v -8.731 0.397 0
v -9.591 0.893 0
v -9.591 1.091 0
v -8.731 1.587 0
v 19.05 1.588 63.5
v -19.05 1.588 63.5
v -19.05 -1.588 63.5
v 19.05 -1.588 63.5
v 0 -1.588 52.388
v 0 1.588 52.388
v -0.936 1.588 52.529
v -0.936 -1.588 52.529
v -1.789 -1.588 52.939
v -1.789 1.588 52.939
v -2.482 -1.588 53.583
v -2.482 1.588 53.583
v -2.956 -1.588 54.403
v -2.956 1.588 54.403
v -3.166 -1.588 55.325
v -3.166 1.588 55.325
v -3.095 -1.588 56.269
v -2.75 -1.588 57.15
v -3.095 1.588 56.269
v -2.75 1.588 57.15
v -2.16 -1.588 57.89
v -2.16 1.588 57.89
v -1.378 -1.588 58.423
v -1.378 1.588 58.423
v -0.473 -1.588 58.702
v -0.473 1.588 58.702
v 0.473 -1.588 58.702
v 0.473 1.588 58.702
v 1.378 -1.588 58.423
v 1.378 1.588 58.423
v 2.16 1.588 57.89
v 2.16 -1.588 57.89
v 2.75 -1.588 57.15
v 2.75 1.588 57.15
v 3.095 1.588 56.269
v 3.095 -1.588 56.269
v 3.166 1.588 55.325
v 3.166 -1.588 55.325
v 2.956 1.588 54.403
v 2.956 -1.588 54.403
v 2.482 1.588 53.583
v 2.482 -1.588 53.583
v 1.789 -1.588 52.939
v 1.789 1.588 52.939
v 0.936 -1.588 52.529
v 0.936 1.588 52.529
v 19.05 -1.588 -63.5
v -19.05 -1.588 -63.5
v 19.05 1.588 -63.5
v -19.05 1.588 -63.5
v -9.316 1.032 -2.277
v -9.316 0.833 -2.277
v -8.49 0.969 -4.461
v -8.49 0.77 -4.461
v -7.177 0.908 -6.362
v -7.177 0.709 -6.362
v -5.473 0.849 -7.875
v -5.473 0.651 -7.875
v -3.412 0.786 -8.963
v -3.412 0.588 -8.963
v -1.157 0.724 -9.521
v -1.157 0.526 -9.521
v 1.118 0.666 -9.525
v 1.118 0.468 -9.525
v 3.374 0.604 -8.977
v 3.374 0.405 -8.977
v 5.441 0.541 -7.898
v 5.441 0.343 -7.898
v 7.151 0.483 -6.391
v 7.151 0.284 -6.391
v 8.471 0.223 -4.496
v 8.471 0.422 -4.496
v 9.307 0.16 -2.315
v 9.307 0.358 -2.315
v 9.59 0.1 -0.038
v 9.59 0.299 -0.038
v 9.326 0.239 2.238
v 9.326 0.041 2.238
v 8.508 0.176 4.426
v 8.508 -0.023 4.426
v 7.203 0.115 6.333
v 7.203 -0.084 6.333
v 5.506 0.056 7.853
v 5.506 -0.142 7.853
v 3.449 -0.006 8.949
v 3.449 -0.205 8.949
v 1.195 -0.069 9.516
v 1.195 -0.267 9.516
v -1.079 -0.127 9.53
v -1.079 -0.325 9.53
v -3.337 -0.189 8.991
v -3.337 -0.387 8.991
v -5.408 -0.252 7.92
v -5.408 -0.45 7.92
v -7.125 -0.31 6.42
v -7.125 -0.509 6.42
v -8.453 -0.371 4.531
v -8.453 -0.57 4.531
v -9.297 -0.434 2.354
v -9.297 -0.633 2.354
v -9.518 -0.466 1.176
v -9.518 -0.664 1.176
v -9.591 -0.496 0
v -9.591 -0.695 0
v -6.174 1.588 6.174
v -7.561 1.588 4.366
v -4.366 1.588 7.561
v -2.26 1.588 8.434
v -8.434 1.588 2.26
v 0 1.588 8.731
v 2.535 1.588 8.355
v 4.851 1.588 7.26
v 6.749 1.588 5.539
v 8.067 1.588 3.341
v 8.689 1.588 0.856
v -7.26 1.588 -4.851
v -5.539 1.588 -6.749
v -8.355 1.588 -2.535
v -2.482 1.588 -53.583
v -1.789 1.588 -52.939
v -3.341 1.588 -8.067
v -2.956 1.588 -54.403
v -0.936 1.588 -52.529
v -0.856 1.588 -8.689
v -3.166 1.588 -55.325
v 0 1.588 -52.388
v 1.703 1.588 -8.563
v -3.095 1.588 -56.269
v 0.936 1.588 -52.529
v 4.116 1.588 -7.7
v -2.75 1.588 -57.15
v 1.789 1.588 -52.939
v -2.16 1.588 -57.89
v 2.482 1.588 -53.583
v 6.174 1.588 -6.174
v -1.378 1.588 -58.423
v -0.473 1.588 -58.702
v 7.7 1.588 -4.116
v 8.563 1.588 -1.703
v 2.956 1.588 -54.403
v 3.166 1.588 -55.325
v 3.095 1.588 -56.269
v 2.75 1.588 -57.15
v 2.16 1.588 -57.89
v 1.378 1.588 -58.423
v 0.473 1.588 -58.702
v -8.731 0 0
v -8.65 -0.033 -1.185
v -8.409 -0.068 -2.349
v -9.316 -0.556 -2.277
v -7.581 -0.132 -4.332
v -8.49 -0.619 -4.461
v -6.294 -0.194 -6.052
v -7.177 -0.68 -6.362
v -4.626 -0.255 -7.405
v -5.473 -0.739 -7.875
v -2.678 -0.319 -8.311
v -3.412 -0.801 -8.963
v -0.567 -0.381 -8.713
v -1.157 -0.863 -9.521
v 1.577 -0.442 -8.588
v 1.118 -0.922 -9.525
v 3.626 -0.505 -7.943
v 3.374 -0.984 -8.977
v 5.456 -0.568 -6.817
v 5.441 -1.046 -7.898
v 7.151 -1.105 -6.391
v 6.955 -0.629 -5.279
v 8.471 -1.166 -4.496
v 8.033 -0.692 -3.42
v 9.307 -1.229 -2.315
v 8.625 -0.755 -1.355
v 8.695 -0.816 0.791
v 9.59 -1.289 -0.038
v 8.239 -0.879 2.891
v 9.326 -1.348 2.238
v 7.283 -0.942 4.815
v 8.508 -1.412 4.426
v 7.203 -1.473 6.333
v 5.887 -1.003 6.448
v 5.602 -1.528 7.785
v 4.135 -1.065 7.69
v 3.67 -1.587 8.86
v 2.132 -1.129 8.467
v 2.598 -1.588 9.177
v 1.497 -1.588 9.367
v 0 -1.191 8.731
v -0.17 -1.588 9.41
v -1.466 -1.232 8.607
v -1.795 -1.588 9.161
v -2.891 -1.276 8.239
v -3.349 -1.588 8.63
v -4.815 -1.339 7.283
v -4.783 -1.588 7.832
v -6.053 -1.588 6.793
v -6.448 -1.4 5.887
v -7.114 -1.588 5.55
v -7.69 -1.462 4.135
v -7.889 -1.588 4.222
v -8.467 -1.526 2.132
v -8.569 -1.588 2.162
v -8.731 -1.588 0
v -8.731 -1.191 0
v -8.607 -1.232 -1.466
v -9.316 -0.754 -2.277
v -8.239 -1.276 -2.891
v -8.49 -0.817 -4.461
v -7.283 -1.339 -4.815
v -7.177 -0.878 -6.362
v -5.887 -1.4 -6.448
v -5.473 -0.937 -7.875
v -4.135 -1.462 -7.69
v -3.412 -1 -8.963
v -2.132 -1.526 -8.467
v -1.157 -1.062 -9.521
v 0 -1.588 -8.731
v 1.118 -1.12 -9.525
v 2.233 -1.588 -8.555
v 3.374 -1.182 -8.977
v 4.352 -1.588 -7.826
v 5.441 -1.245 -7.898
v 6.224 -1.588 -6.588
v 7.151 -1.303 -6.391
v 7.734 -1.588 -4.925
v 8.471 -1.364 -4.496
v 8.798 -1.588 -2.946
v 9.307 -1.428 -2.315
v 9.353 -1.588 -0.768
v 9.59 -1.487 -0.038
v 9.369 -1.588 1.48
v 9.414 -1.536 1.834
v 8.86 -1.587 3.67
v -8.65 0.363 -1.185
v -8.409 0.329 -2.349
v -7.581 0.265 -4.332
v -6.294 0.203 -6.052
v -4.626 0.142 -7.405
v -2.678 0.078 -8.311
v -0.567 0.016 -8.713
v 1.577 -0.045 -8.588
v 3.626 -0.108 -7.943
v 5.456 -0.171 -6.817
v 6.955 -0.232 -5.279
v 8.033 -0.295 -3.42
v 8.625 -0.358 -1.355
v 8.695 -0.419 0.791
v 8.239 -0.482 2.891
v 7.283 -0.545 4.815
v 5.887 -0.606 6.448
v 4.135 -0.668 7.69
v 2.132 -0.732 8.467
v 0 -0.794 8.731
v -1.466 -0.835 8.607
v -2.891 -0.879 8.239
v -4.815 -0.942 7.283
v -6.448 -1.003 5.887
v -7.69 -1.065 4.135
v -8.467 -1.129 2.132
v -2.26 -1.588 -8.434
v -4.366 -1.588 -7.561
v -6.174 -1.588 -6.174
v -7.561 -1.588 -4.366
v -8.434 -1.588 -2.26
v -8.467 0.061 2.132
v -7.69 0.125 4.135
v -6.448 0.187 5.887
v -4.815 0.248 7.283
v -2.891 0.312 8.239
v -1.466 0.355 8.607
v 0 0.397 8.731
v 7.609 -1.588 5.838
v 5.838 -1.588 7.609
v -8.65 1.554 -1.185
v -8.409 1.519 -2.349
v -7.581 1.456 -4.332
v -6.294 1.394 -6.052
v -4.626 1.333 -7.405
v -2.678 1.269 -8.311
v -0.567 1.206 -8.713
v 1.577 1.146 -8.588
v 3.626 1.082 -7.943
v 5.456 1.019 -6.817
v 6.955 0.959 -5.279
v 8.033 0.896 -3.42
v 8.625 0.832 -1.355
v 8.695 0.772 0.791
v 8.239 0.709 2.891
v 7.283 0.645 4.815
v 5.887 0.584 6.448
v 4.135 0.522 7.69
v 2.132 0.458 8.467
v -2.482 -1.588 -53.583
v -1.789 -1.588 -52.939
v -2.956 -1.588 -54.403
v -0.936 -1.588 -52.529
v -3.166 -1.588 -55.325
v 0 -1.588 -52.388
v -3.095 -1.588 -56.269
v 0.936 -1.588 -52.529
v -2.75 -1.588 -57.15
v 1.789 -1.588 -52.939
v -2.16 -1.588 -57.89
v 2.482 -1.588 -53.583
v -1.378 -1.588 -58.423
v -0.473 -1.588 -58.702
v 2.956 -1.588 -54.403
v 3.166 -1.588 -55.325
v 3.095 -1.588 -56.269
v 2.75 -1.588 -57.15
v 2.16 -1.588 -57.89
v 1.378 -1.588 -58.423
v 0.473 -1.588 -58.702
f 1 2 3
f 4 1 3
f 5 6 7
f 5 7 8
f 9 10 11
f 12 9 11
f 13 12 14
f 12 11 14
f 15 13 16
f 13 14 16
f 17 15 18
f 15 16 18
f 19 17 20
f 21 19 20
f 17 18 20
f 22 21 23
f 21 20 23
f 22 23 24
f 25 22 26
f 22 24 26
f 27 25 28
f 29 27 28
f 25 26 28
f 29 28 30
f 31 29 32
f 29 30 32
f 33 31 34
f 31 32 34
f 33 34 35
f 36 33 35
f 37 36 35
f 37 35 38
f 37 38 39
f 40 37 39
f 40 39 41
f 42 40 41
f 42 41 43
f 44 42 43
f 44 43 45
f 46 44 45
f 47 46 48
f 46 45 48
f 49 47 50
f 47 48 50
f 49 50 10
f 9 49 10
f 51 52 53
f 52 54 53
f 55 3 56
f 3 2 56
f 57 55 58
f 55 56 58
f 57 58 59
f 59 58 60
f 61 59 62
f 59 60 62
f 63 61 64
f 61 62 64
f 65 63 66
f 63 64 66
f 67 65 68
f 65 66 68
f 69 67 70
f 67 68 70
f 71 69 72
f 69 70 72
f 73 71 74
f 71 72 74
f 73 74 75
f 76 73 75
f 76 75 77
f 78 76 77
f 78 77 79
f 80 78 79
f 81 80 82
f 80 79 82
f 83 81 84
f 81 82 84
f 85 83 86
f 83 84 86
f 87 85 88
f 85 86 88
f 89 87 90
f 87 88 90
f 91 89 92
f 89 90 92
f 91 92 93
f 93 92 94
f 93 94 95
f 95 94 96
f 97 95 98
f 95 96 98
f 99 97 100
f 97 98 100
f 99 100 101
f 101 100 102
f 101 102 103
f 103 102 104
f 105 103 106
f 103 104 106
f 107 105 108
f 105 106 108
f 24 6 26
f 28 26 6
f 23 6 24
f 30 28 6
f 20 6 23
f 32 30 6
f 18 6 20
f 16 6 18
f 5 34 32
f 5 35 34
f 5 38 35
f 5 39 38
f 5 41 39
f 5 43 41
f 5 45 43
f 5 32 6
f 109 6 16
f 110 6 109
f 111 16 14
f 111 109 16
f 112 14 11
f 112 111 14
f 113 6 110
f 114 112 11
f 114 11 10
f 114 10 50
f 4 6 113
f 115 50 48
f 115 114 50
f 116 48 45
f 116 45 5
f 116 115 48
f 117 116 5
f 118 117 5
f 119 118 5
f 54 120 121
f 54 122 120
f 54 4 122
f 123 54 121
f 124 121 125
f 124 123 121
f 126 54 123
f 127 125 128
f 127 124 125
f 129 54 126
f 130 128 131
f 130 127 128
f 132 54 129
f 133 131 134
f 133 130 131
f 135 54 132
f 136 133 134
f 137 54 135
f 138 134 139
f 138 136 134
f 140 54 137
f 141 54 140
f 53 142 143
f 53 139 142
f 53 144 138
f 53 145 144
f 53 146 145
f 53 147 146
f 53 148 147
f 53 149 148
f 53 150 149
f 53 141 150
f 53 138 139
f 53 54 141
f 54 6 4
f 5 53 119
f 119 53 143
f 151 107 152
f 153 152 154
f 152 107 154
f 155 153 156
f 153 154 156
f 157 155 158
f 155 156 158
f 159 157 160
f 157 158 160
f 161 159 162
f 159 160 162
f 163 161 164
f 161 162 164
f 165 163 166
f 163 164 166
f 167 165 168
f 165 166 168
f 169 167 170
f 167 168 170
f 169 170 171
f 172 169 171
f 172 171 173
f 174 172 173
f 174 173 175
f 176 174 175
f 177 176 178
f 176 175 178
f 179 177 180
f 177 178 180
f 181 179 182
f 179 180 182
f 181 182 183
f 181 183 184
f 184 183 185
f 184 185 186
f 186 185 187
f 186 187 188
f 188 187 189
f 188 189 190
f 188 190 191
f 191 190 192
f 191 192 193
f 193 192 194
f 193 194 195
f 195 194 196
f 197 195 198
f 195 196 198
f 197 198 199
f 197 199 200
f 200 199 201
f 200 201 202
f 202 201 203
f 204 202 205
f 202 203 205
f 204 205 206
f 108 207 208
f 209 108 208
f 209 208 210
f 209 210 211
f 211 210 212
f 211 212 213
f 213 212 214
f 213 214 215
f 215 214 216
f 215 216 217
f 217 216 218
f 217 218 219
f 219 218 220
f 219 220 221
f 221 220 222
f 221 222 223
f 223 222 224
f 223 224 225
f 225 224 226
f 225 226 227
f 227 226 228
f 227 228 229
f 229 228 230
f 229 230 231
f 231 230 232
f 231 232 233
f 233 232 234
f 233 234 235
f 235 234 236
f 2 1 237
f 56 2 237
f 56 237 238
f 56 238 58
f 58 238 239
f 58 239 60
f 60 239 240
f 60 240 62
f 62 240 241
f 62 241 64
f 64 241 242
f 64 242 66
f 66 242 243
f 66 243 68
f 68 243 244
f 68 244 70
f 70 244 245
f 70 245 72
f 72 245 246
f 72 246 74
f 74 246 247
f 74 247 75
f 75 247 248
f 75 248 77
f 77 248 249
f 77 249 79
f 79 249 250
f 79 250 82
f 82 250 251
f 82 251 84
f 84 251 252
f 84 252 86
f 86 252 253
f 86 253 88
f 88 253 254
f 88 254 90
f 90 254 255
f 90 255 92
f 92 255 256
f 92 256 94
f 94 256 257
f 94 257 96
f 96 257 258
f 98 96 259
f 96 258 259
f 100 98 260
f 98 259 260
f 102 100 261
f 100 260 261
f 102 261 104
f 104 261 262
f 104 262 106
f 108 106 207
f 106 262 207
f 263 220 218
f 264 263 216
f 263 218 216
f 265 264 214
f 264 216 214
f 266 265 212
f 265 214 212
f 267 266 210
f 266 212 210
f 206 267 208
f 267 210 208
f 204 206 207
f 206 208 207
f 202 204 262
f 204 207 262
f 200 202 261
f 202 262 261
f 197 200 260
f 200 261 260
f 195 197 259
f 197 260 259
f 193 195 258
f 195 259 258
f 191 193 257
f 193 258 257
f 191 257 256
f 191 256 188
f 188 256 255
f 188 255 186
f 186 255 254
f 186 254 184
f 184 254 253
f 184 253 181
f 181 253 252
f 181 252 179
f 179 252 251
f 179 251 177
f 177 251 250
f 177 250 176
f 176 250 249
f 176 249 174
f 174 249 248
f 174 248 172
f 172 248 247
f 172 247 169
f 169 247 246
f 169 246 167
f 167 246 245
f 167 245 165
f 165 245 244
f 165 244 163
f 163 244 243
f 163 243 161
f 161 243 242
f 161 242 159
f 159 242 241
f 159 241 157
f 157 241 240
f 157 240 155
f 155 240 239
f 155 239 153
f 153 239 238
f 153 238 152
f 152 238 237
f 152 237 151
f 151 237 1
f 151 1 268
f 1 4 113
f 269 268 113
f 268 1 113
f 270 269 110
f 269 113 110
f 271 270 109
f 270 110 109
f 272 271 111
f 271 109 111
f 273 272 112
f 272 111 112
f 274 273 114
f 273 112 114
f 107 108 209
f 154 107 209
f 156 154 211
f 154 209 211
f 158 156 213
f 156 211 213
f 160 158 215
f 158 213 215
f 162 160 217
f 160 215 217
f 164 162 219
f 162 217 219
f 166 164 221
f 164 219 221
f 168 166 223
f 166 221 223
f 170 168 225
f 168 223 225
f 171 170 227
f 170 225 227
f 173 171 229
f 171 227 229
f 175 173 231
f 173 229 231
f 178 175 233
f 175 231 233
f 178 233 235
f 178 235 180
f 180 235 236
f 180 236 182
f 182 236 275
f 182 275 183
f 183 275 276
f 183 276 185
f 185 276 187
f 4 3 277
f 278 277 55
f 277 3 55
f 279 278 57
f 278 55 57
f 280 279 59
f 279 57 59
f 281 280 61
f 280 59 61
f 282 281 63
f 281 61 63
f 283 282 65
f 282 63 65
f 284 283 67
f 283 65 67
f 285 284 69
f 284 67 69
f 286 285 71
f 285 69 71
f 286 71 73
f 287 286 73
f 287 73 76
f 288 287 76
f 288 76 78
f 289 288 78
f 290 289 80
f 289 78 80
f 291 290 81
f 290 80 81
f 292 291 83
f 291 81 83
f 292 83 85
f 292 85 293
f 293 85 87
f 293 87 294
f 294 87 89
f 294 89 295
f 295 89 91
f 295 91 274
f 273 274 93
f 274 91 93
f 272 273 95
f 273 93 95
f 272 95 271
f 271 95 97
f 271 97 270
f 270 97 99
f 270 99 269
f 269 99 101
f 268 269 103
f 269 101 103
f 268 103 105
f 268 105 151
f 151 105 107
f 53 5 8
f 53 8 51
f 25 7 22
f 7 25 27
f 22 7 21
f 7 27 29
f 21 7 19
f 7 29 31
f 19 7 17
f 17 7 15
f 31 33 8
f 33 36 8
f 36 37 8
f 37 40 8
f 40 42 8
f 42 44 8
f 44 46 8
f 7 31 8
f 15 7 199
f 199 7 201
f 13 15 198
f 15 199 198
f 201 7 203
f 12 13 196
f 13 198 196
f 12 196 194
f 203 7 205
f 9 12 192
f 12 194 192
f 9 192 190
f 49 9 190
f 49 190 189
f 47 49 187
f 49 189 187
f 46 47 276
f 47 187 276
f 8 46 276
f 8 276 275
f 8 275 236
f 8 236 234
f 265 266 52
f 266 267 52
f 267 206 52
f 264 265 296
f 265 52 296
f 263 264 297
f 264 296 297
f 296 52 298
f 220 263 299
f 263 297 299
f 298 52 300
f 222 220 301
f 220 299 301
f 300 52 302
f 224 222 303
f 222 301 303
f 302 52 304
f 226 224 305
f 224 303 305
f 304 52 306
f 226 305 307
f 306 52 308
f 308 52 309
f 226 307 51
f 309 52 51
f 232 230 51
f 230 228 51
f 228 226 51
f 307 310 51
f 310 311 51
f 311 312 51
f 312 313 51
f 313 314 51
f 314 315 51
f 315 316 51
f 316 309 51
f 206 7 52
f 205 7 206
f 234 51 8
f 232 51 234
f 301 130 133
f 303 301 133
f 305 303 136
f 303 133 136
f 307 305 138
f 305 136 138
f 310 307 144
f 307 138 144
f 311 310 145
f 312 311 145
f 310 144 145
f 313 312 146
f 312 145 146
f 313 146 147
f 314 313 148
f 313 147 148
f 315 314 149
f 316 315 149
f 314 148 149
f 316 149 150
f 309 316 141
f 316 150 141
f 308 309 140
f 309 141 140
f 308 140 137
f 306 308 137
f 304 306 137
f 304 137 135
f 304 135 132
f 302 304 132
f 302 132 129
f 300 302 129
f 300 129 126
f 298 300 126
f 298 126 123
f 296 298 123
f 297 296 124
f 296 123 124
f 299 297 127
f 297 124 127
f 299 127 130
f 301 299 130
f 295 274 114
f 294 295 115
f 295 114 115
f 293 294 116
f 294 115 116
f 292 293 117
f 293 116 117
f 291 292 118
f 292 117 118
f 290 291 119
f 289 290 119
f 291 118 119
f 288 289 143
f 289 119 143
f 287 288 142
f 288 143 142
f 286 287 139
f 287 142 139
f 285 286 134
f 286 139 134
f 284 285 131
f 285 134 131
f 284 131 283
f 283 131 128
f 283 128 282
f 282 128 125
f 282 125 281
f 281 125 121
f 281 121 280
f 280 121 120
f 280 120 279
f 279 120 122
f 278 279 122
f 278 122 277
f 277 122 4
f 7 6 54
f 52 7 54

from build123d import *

# Parameters (mm, degrees)
SKETCH1_W           = 38.1
SKETCH1_H           = 127
BOSS_EXTRUDE1_DEPTH = 1.5875
SKETCH2_R           = 8.73125
CUT_EXTRUDE1_DEPTH  = 19.05
SKETCH3_R           = 3.175
CUT_EXTRUDE2_DEPTH  = 3.175
THREAD1_PITCH       = 1.5875


with BuildPart() as part:
    # Sketch1 → Boss-Extrude1 (new, symmetric)
    with BuildSketch(Plane(origin=(0, 0, 0), x_dir=(1, 0, 0), z_dir=(0, 1, 0))):
        Rectangle(SKETCH1_W, SKETCH1_H)
    extrude(amount=BOSS_EXTRUDE1_DEPTH, both=True)

    # Sketch2 → Cut-Extrude1 (cut)
    with BuildSketch(Plane(origin=(0, 1.5875, 0), x_dir=(1, 0, 0), z_dir=(0, 1, 0))):
        with Locations(Location((0, 0, 0), (0, 0, 270))):
            Circle(SKETCH2_R)
    extrude(amount=-CUT_EXTRUDE1_DEPTH, mode=Mode.SUBTRACT)

    # Sketch3 → Cut-Extrude2 (cut)
    with BuildSketch(Plane(origin=(0, 1.5875, 0), x_dir=(1, 0, 0), z_dir=(0, 1, 0))):
        with Locations(Location((0, 55.5625, 0), (0, 0, 270))):
            Circle(SKETCH3_R)
        with Locations(Location((0, -55.5625, 0), (0, 0, 90))):
            Circle(SKETCH3_R)
    extrude(amount=-CUT_EXTRUDE2_DEPTH, mode=Mode.SUBTRACT)

    # Thread1: the profile of Thread Profile1 profile screwed along a right-hand helix of 2 turns, 8 arcs to a turn; built about Z, then put on its axis
    thread1_z = Axis((0, 0, 0), (0, 0, 1))
    thread1_corners = [(8.73095, 0, -0.000173205), (9.590509577, 0, 0.496093748), (9.590509577, 0, 0.694531248), (8.73095, 0, 1.190798201)]
    with BuildLine(mode=Mode.PRIVATE) as thread1_profile:
        Line(thread1_corners[0], thread1_corners[1])
        Line(thread1_corners[1], thread1_corners[2])
        Line(thread1_corners[2], thread1_corners[3])
        Line(thread1_corners[3], thread1_corners[0])
    thread1_cap = Face(thread1_profile.wire())
    thread1_turn_angles = [0, 22.5, 45, 67.5, 90, 112.5, 135, 157.5, 180, 202.5, 225, 247.5, 270, 292.5, 315, 337.5, 360]
    thread1_turn_weights = [1, 0.9238795325112867, 1, 0.9238795325112867, 1, 0.9238795325112867, 1, 0.9238795325112867, 1, 0.9238795325112867, 1, 0.9238795325112867, 1, 0.9238795325112867, 1, 0.9238795325112867, 1]
    thread1_turn_rails = [Edge.make_bspline([Vector(p[0], p[1], 0).rotate(thread1_z, thread1_turn_angles[k]) / thread1_turn_weights[k] + Vector(0, 0, p[2] + THREAD1_PITCH * thread1_turn_angles[k] / 360) for k in range(17)], [0, 0, 0, 1, 1, 2, 2, 3, 3, 4, 4, 5, 5, 6, 6, 7, 7, 8, 8, 8], 2, thread1_turn_weights) for p in thread1_corners]
    thread1_turn_sides = [Face.make_surface_from_curves(thread1_turn_rails[p[0]], thread1_turn_rails[p[1]]) for p in [(0, 1), (1, 2), (2, 3), (3, 0)]]
    thread1 = Plane(origin=(0, 1.5875, 0), x_dir=(-1, 0, 0), z_dir=(0, -1, 0)) * Solid(Shell([*[p.moved(Location((0, 0, THREAD1_PITCH * i))) for i in range(2) for p in thread1_turn_sides], thread1_cap, thread1_cap.rotate(thread1_z, 720).moved(Location((0, 0, THREAD1_PITCH * 720 / 360)))]))
    add(thread1, mode=Mode.SUBTRACT)


solid = part.part
